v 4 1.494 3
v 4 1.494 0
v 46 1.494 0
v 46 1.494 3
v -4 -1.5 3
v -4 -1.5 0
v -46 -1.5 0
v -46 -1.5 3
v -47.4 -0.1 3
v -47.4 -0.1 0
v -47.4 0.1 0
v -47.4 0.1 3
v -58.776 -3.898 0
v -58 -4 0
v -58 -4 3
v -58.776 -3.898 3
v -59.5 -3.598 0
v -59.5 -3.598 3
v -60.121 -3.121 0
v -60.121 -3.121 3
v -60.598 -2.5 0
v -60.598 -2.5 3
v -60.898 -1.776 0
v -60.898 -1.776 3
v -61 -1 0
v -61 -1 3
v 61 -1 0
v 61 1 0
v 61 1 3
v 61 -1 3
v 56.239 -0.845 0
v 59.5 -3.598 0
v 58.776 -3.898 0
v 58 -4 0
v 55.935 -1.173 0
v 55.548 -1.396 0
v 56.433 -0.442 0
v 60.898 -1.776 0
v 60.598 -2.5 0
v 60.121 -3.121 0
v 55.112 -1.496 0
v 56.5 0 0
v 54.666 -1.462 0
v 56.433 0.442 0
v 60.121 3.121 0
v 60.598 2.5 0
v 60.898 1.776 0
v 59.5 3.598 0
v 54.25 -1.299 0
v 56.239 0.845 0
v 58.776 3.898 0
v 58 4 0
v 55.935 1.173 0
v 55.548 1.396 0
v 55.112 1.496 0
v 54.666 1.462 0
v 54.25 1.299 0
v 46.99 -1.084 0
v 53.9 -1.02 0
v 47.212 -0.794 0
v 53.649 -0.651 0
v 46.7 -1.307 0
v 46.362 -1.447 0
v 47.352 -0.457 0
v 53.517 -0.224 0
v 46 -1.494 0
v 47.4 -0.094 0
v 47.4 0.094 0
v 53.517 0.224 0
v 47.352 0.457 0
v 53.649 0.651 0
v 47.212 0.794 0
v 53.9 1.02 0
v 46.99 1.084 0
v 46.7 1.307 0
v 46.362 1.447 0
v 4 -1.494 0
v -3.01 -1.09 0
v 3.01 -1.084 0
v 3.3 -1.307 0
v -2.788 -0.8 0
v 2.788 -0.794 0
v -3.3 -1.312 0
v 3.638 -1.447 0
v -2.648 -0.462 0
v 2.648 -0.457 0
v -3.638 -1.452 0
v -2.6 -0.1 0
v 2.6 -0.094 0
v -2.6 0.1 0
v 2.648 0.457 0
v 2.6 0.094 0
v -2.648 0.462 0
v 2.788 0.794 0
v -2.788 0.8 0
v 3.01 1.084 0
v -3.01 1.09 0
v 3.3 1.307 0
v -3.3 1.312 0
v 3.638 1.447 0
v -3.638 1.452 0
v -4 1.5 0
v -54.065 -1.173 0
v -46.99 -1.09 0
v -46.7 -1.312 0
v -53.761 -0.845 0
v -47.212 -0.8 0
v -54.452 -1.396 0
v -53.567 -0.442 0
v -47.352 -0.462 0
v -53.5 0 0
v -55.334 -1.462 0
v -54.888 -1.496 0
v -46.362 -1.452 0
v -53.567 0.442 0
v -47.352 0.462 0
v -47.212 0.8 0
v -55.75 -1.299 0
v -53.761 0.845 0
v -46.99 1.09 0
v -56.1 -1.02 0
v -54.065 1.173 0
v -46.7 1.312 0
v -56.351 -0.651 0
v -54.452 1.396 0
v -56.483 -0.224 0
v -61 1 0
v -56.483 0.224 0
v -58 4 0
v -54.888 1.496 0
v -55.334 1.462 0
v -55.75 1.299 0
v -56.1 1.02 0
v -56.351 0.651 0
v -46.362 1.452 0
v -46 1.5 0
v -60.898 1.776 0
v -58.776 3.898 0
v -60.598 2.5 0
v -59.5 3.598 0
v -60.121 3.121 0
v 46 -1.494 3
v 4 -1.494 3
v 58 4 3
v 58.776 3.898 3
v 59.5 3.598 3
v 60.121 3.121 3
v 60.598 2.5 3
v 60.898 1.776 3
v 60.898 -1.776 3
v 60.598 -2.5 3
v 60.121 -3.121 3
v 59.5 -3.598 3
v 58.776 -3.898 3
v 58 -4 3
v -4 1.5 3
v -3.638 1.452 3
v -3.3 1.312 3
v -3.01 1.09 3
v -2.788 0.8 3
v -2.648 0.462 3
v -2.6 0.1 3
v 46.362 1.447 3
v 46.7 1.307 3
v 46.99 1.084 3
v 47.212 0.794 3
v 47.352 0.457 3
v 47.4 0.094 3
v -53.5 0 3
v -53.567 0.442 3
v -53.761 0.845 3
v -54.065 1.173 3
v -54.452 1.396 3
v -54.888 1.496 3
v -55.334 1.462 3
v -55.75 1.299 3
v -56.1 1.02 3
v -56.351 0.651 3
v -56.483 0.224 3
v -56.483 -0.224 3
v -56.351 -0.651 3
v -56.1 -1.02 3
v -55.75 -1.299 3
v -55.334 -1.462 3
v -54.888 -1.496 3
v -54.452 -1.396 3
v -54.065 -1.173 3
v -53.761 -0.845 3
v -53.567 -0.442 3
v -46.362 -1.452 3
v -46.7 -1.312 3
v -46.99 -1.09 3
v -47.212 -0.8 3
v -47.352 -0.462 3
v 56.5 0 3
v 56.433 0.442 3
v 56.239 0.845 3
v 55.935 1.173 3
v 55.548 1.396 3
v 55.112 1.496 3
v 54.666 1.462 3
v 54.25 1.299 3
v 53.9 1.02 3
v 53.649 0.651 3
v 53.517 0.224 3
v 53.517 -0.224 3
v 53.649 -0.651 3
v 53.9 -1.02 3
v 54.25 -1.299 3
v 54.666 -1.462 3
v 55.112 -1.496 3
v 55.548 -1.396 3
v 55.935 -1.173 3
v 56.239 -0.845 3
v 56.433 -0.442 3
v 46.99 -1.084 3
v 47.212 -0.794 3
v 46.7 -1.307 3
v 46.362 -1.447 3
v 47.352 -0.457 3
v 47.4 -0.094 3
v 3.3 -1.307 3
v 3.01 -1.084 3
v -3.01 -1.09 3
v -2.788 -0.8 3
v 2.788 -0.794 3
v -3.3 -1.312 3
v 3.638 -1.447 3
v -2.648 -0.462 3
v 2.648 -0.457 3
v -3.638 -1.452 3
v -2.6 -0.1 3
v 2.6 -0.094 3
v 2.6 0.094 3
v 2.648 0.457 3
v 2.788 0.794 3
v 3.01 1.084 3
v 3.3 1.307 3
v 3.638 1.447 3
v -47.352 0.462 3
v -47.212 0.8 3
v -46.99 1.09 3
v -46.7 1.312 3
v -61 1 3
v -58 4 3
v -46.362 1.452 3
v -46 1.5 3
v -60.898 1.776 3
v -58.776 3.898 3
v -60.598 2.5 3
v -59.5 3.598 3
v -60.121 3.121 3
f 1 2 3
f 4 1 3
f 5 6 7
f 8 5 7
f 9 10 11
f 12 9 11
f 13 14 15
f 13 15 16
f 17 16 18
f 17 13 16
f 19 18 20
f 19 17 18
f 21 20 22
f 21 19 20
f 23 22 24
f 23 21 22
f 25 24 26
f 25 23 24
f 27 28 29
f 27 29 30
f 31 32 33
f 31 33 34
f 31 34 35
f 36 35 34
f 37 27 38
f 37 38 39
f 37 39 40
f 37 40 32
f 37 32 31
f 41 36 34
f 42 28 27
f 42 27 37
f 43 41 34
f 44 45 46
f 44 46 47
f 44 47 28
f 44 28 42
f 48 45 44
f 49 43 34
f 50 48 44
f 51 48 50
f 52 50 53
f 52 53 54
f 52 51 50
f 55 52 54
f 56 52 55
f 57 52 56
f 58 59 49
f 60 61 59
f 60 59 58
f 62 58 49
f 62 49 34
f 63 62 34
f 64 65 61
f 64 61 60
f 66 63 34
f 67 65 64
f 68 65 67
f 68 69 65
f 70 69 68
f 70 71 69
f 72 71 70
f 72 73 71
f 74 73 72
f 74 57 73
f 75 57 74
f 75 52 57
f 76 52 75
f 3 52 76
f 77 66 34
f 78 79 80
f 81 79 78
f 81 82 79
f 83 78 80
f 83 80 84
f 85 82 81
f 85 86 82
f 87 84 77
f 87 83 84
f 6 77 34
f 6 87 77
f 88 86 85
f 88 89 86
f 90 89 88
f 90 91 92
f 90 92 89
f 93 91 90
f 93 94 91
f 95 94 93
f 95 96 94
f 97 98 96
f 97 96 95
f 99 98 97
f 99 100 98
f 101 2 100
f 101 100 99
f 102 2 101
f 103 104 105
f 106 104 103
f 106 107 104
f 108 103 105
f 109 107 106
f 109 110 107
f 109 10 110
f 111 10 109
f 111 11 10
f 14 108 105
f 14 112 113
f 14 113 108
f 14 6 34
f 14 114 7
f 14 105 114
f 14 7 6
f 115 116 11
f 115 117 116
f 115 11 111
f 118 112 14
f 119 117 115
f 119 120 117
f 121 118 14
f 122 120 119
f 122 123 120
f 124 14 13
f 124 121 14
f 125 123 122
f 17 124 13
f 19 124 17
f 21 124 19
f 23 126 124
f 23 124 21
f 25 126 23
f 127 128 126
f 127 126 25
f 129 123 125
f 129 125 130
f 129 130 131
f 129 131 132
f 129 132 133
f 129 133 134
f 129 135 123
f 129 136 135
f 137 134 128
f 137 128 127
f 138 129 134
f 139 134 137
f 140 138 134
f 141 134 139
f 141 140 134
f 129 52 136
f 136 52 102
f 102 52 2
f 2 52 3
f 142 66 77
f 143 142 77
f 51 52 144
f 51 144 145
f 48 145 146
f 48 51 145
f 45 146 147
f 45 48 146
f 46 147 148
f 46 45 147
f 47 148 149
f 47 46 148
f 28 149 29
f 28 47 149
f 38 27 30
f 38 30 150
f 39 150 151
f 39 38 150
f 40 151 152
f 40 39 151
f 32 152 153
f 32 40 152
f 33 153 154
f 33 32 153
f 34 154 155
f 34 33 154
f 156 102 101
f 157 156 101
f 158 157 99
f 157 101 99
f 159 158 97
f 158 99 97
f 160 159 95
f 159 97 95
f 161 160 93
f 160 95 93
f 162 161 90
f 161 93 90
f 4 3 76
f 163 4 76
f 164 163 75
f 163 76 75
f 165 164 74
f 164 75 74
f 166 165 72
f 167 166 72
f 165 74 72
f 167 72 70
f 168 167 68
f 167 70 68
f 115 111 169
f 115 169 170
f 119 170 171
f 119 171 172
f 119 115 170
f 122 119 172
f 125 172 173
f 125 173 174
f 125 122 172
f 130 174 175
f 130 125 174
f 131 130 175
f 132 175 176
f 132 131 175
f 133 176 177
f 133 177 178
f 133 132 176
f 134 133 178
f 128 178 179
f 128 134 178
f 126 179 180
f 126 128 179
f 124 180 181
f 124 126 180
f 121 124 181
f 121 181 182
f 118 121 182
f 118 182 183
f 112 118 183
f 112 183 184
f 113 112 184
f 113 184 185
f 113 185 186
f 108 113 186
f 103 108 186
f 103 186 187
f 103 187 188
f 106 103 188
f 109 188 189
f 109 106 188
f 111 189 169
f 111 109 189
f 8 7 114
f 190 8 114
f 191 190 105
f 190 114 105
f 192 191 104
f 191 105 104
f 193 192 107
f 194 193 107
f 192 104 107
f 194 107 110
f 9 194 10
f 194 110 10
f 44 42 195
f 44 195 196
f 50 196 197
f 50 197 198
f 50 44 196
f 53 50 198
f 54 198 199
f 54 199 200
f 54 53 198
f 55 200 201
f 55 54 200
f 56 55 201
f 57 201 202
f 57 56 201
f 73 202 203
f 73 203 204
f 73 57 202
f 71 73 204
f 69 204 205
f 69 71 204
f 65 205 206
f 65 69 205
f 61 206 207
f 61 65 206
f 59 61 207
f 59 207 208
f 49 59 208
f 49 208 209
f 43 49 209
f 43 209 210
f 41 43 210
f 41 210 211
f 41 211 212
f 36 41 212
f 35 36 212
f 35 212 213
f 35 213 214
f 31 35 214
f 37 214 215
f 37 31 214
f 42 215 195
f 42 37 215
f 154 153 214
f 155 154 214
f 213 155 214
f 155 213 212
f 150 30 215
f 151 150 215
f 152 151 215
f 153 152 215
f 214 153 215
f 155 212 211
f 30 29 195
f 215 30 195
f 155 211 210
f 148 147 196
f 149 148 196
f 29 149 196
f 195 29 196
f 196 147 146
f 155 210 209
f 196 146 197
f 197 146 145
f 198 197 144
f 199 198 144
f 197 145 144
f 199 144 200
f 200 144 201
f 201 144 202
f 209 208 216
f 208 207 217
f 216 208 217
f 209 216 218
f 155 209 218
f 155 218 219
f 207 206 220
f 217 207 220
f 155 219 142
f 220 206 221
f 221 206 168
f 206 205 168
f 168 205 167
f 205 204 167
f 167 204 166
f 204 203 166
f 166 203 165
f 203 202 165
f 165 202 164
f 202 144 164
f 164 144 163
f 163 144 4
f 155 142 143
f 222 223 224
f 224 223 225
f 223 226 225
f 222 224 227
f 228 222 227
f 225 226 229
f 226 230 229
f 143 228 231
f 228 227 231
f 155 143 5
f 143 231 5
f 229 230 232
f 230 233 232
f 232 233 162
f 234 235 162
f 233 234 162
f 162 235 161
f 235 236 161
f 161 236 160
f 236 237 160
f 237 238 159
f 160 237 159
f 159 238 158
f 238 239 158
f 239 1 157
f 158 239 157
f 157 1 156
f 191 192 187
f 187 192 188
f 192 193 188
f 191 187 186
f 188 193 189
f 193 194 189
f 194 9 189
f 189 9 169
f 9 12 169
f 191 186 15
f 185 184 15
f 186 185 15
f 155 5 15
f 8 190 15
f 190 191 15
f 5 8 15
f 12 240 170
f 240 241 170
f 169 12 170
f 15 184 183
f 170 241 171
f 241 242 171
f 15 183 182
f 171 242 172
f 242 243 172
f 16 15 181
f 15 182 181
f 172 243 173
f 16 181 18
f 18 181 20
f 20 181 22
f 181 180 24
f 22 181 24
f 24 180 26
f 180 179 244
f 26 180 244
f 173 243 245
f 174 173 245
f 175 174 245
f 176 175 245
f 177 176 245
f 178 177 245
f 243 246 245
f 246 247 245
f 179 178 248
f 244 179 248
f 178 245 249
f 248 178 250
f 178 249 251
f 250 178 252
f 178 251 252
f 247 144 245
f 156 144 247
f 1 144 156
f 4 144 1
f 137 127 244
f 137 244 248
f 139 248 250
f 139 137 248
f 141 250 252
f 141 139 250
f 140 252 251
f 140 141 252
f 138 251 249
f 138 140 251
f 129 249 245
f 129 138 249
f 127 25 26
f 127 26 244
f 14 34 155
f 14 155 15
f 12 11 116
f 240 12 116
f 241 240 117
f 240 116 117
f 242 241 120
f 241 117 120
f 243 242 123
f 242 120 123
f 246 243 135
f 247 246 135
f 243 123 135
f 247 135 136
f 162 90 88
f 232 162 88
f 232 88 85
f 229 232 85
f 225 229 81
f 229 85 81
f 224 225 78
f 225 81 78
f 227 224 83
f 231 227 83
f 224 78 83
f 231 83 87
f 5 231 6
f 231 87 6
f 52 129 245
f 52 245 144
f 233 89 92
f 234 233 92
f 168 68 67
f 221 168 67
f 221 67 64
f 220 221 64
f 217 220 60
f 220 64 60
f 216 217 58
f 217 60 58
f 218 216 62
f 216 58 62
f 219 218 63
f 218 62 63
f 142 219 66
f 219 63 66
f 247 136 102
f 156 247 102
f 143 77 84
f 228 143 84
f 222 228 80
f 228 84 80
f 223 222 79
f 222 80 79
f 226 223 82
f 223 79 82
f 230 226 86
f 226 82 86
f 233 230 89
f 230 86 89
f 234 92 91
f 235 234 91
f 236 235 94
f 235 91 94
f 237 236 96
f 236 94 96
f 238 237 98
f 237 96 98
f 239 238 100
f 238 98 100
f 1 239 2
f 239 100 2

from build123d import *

# Parameters (mm, degrees)
SKETCH1_R           = 1.5
BOSS_EXTRUDE1_DEPTH = 3


with BuildPart() as part:
    # Sketch1 → Boss-Extrude1 (new body)
    with BuildSketch(Plane.XY):
        with BuildLine():
            Line((-58, 4), (58, 4))
            ThreePointArc((58, 4), (60.121320344, 3.121320344), (61, 1))
            Line((61, 1), (61, -1))
            ThreePointArc((61, -1), (60.121320344, -3.121320344), (58, -4))
            Line((58, -4), (-58, -4))
            ThreePointArc((-58, -4), (-60.121320344, -3.121320344), (-61, -1))
            Line((-61, -1), (-61, 1))
            ThreePointArc((-61, 1), (-60.121320344, 3.121320344), (-58, 4))
        make_face()
        with Locations((-55, 0)):
            Circle(SKETCH1_R, mode=Mode.SUBTRACT)
        with Locations((55, 0)):
            Circle(SKETCH1_R, mode=Mode.SUBTRACT)
        with BuildLine():
            Line((-46, 1.5), (-4, 1.5))
            ThreePointArc((-4, 1.5), (-3.010050506, 1.089949494), (-2.6, 0.1))
            Line((-2.6, 0.1), (-2.6, -0.1))
            ThreePointArc((-2.6, -0.1), (-3.010050506, -1.089949494), (-4, -1.5))
            Line((-4, -1.5), (-46, -1.5))
            ThreePointArc((-46, -1.5), (-46.989949494, -1.089949494), (-47.4, -0.1))
            Line((-47.4, -0.1), (-47.4, 0.1))
            ThreePointArc((-47.4, 0.1), (-46.989949494, 1.089949494), (-46, 1.5))
        make_face(mode=Mode.SUBTRACT)
        with BuildLine():
            Line((4, 1.494330249), (46, 1.494330249))
            ThreePointArc((46, 1.494330249), (46.989949494, 1.084279743), (47.4, 0.094330249))
            Line((47.4, 0.094330249), (47.4, -0.094330249))
            ThreePointArc((47.4, -0.094330249), (46.989949494, -1.084279743), (46, -1.494330249))
            Line((46, -1.494330249), (4, -1.494330249))
            ThreePointArc((4, -1.494330249), (3.010050506, -1.084279743), (2.6, -0.094330249))
            Line((2.6, -0.094330249), (2.6, 0.094330249))
            ThreePointArc((2.6, 0.094330249), (3.010050506, 1.084279743), (4, 1.494330249))
        make_face(mode=Mode.SUBTRACT)
    extrude(amount=BOSS_EXTRUDE1_DEPTH)


solid = part.part
